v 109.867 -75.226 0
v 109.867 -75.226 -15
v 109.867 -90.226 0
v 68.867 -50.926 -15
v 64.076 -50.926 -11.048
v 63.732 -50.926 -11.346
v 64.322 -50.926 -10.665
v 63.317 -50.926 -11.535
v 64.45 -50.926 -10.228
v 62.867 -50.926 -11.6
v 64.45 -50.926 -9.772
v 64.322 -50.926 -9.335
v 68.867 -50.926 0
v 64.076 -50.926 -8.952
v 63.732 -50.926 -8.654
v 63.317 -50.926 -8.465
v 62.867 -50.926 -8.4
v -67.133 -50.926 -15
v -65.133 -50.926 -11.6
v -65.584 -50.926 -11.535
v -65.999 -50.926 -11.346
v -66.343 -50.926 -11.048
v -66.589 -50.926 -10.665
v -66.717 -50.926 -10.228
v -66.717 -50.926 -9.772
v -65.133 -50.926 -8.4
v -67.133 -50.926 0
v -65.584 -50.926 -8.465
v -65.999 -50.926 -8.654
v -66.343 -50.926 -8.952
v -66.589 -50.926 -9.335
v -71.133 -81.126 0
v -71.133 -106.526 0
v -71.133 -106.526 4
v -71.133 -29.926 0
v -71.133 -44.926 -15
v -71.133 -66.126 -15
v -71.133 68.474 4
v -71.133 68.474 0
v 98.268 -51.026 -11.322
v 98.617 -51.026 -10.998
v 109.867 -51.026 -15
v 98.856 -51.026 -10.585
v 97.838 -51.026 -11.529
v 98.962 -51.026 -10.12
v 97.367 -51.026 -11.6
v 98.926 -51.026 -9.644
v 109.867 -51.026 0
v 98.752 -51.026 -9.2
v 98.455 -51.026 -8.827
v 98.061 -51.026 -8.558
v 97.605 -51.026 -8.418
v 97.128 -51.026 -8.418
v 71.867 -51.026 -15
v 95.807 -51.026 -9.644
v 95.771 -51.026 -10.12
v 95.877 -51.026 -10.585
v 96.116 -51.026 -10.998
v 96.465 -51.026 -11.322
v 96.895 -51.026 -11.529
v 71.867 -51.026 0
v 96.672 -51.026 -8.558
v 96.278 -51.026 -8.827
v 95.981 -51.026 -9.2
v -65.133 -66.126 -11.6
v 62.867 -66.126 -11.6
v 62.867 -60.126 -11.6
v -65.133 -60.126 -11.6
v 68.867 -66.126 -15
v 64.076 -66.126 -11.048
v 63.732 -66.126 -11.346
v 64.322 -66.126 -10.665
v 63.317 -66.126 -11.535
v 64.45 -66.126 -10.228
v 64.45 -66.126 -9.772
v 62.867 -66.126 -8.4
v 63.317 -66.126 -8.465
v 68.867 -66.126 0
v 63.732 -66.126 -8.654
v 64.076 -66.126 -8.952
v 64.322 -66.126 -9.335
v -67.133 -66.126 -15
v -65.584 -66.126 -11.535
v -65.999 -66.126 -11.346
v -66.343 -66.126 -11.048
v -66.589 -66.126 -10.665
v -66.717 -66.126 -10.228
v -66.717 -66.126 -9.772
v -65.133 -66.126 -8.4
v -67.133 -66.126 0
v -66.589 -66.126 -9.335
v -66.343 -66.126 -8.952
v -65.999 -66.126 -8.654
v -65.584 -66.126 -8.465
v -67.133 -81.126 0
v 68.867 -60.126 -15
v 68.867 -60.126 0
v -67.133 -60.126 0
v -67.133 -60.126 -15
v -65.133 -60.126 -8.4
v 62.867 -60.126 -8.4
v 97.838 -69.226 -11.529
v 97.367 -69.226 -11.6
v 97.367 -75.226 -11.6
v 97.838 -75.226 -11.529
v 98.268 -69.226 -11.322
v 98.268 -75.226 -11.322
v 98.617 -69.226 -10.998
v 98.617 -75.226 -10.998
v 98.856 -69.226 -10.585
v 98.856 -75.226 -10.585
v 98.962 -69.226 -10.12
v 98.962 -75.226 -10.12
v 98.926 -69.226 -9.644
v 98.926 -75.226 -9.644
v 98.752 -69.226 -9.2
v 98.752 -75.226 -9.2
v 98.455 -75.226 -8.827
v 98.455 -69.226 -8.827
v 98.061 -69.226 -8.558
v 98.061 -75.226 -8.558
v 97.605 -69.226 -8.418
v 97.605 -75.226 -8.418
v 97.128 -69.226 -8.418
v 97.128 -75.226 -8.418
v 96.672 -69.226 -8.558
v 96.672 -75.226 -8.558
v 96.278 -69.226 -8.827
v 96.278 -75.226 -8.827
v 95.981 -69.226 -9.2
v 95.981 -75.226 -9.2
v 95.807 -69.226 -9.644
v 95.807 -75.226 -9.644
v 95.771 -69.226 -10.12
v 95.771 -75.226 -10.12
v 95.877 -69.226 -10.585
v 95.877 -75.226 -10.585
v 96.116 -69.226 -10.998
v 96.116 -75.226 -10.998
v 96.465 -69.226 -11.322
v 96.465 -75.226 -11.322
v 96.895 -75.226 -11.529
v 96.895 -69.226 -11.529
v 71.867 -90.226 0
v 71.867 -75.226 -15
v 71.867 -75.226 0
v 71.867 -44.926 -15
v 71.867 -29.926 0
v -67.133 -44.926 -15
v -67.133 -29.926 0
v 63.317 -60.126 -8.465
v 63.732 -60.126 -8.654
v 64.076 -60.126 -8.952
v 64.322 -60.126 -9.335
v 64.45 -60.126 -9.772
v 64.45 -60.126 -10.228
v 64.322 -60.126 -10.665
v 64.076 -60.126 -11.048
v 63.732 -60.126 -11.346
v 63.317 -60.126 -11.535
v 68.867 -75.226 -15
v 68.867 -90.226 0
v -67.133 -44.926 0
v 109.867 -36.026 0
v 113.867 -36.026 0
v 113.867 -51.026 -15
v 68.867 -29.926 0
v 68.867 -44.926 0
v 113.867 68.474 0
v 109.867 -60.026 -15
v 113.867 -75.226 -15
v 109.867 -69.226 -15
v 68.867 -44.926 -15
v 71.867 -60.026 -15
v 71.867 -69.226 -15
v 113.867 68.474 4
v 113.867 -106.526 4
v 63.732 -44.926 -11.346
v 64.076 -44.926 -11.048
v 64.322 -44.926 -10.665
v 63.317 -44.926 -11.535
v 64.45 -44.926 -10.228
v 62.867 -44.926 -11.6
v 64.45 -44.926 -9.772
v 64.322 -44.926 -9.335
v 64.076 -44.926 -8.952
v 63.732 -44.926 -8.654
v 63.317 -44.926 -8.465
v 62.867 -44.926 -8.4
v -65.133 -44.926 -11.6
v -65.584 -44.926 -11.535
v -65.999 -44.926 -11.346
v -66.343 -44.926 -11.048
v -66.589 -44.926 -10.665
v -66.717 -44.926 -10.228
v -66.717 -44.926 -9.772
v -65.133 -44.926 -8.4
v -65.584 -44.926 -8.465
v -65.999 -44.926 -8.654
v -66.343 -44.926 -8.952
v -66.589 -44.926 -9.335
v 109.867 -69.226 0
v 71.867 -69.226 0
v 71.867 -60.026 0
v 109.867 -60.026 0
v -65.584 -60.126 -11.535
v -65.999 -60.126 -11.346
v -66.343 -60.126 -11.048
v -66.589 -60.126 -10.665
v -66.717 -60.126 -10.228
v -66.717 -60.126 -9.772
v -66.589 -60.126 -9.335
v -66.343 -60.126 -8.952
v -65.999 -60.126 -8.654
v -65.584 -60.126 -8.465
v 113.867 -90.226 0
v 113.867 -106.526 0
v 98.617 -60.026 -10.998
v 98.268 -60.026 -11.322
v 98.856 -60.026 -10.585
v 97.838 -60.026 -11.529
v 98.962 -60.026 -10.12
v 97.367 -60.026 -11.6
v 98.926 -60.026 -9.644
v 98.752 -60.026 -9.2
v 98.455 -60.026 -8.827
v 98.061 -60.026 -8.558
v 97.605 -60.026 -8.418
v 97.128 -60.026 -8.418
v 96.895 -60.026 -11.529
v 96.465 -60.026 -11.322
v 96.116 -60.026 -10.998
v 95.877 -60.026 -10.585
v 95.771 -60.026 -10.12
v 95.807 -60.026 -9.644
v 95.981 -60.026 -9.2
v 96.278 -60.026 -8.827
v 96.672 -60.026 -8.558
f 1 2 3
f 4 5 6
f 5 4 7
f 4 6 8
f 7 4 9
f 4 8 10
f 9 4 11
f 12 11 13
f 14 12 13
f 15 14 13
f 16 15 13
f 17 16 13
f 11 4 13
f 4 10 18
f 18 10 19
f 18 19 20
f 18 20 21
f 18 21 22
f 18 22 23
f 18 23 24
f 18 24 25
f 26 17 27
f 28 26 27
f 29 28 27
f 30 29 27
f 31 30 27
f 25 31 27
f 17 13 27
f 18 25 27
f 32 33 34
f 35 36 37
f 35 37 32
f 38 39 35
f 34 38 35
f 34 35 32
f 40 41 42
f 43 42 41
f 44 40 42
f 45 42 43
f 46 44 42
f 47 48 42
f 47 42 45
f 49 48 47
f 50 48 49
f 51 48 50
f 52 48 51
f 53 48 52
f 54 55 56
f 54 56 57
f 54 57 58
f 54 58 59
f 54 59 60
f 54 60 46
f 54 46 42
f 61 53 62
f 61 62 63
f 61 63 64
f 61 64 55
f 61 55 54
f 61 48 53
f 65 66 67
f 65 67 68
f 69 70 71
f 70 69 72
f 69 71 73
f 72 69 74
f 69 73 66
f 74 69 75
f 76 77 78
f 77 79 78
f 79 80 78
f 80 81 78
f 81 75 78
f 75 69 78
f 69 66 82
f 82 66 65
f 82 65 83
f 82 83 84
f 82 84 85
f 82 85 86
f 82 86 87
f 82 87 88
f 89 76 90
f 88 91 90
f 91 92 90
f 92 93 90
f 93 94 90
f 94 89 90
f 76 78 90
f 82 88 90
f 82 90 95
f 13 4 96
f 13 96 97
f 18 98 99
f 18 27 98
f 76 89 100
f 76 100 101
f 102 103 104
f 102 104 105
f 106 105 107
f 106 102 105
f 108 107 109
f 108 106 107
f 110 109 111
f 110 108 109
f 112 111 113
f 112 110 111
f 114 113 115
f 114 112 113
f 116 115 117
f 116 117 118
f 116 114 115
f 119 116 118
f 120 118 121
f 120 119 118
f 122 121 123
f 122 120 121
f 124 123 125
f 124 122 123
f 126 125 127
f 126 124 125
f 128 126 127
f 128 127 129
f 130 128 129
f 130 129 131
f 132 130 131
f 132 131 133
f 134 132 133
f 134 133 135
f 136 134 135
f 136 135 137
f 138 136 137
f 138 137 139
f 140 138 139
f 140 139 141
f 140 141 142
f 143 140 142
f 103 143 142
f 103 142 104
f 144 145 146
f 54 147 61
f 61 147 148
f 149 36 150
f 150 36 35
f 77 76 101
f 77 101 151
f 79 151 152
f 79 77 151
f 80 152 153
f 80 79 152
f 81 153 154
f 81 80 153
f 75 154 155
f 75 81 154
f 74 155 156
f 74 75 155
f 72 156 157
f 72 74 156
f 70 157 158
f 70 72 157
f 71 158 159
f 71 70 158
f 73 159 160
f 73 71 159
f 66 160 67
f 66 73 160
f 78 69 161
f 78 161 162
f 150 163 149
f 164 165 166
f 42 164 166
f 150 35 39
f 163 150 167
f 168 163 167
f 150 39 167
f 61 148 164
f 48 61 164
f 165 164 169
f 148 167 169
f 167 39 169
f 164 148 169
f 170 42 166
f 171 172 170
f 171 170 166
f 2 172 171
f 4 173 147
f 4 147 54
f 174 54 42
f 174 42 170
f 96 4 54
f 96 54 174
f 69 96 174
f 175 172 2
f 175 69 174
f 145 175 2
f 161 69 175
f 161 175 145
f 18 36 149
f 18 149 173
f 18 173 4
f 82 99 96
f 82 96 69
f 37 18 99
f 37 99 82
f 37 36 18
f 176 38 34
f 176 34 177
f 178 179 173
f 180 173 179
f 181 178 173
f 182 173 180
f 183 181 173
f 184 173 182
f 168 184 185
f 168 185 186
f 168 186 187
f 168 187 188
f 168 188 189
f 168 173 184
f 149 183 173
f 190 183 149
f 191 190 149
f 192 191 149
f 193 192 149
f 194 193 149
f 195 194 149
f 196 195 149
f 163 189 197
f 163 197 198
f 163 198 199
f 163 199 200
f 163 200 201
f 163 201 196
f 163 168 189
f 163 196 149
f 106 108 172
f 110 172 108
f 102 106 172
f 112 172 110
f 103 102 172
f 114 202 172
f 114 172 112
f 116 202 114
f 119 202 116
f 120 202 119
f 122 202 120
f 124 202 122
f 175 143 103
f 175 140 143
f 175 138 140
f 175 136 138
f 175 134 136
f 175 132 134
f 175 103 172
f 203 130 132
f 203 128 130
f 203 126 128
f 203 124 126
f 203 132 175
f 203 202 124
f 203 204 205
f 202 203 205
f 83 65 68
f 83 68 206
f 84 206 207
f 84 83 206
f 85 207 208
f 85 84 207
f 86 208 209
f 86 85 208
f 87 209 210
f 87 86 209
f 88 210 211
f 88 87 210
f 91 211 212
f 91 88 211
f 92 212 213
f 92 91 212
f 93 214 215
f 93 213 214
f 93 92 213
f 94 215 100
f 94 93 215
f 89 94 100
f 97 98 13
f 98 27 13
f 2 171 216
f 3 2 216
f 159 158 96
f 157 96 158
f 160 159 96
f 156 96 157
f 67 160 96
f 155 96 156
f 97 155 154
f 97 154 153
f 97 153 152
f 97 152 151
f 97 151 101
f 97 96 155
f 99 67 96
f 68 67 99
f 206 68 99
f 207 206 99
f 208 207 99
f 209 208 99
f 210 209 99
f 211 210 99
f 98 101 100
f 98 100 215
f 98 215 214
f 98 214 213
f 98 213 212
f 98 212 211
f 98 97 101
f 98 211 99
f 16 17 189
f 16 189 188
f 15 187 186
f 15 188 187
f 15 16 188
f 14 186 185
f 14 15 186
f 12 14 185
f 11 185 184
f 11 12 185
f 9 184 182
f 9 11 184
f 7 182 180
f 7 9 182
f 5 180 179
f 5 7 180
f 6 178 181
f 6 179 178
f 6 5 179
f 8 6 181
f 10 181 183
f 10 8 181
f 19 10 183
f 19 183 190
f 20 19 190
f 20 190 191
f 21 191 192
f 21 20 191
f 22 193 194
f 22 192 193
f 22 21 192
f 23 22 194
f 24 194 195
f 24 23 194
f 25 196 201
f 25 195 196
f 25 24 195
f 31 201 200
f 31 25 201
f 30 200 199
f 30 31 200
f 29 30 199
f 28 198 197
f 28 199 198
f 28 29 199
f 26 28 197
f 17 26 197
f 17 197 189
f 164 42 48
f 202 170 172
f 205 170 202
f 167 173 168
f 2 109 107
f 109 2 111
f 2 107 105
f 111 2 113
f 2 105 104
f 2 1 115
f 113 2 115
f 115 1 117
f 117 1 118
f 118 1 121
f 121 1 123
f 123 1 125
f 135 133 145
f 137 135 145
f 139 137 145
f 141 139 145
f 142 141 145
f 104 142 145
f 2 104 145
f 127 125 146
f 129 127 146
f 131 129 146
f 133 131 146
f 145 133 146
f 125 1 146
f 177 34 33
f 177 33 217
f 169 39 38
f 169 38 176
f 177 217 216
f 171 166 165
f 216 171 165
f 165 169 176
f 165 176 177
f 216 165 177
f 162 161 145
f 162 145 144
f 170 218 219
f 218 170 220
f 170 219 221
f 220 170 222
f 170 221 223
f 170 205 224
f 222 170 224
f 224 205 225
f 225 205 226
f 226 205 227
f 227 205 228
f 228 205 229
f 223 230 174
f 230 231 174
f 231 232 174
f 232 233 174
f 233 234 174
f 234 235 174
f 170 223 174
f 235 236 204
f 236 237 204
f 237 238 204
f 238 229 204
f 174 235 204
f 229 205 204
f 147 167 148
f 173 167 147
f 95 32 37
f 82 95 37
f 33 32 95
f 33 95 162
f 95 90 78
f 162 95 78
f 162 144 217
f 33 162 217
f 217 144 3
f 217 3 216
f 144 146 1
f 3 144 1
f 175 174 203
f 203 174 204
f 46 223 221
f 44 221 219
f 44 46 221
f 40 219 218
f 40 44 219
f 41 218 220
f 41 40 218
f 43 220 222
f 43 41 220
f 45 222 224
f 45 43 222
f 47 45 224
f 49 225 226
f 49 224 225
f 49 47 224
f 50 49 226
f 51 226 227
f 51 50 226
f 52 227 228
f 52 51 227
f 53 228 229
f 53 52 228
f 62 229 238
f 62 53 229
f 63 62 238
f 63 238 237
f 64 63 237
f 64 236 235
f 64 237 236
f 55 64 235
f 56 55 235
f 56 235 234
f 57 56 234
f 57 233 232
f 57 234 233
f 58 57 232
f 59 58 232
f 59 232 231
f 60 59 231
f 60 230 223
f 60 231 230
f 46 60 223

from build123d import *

# Parameters (mm, degrees)
SKETCH_1_W          = 185
SKETCH_1_H          = 175
EXTRUDE_1_DEPTH     = 4
SKETCH_2_W          = 140
SKETCH_2_H          = 6
EXTRUDE_2_DEPTH     = 15
CUT_EXTRUDE_1_REACH = 210.987
SKETCH_4_W          = 45
SKETCH_4_H          = 9
SKETCH_4_H_2        = 6
EXTRUDE_5_DEPTH     = 15
SKETCH_7_W          = 185
SKETCH_7_H          = 4
EXTRUDE_6_DEPTH     = 40
SKETCH_6_W          = 185
SKETCH_6_H          = 4
CUT_EXTRUDE_3_DEPTH = 40
CUT_EXTRUDE_START   = -24.2
SKETCH_5_R          = 1.6
CUT_EXTRUDE_2_DEPTH = 24.2
EXTRUDE_7_DEPTH     = 3
EXTRUDE_8_DEPTH     = 4
EXTRUDE_9_DEPTH     = 4


with BuildPart() as part:
    # 草圖1 → 填料-伸長1 (new body)
    with BuildSketch(Plane.XY):
        with Locations((21.366509782, 20.973731884)):
            Rectangle(SKETCH_1_W, SKETCH_1_H)
    extrude(amount=EXTRUDE_1_DEPTH)

    # 草圖2 → 填料-伸長2 (add)
    with BuildSketch(Plane(origin=(0, 0, 0), x_dir=(-1, 0, 0), z_dir=(0, 0, -1))):
        with Locations((1.133490218, -63.126268116)):
            Rectangle(SKETCH_2_W, SKETCH_2_H)
        with Locations((1.133490218, -47.926268116)):
            Rectangle(SKETCH_2_W, SKETCH_2_H)
    extrude(amount=EXTRUDE_2_DEPTH)

    # 除料-伸長1: up to this face of the body (flat: up to its plane)
    cut_extrude_1_end = Plane(part.part.faces().sort_by_distance((-1.133490218, -44.926268116, -7.5))[0])
    # 草圖3 → 除料-伸長1 (cut, up to the picked face)
    with BuildSketch(Plane.XZ.offset(66.126268116), mode=Mode.PRIVATE) as cut_extrude_1_sk1:
        with BuildLine():
            Line((-65.133490218, -8.4), (62.866509782, -8.4))
            ThreePointArc((62.866509782, -8.4), (64.466509782, -10), (62.866509782, -11.6))
            Line((62.866509782, -11.6), (-65.133490218, -11.6))
            ThreePointArc((-65.133490218, -11.6), (-66.733490218, -10), (-65.133490218, -8.4))
        make_face()
    cut_extrude_1_tool1 = split(extrude(cut_extrude_1_sk1.sketch, amount=-CUT_EXTRUDE_1_REACH, mode=Mode.PRIVATE), bisect_by=cut_extrude_1_end, keep=Keep.BOTH, mode=Mode.PRIVATE)
    add(cut_extrude_1_tool1.solids().sort_by(Axis((-1.13349, -66.126268, -10), (0, 1, 0)))[0], mode=Mode.SUBTRACT)

    # 草圖4 → 填料-伸長5 (add)
    with BuildSketch(Plane(origin=(0, 0, 0), x_dir=(-1, 0, 0), z_dir=(0, 0, -1))):
        with Locations((-91.366509782, -55.526268116)):
            Rectangle(SKETCH_4_W, SKETCH_4_H)
        with Locations((-91.366509782, -72.226268116)):
            Rectangle(SKETCH_4_W, SKETCH_4_H_2)
    extrude(amount=EXTRUDE_5_DEPTH)


with BuildPart() as extrude_5_piece_1:
    # of the separate pieces the step leaves, piece 1, a body of its own (extrude_5_pieces)
    add(part.part.solids().sort_by_distance((-71.133490218, 108.473731884, 0))[0])

    # 草圖7 → 填料-伸長6 (add)
    with BuildSketch(Plane.XZ.offset(66.526268116)):
        with Locations((21.366509782, 2)):
            Rectangle(SKETCH_7_W, SKETCH_7_H)
    extrude(amount=EXTRUDE_6_DEPTH)

    # 草圖6 → 除料-伸長3 (cut)
    with BuildSketch(Plane(origin=(0, 108.473731884, 0), x_dir=(1, 0, 0), z_dir=(0, 1, 0))):
        with Locations((21.366509782, -2)):
            Rectangle(SKETCH_6_W, SKETCH_6_H)
    extrude(amount=-CUT_EXTRUDE_3_DEPTH, mode=Mode.SUBTRACT)


with BuildPart() as extrude_5_piece_2:
    # of the separate pieces the step leaves, piece 2, a body of its own (extrude_5_pieces)
    add(part.part.solids().sort_by_distance((68.866509782, -69.226268116, 0))[0])


with BuildPart() as cut_extrude_2_tool:
    # 草圖5 → 除料-伸長2 (new body)
    with BuildSketch(Plane.XZ.offset(75.226268116).offset(CUT_EXTRUDE_START)):
        with Locations(Location((97.366509782, -10, 0), (0, 0, 270))):
            Circle(SKETCH_5_R)
    extrude(amount=CUT_EXTRUDE_2_DEPTH)


with BuildPart() as extrude_5_piece_1_1:
    add(extrude_5_piece_1.part)

    # 除料-伸長2: cut by cut_extrude_2_tool
    add(cut_extrude_2_tool.part, mode=Mode.SUBTRACT)



with BuildPart() as extrude_5_piece_2_1:
    add(extrude_5_piece_2.part)

    # 除料-伸長2: cut by cut_extrude_2_tool
    add(cut_extrude_2_tool.part, mode=Mode.SUBTRACT)


with BuildPart() as extrude_5_piece_1_2:
    add(extrude_5_piece_1_1.part)

    add(extrude_5_piece_2_1.part)  # 填料-伸長7 merges 填料-伸長5 piece 2
    # 草圖8 → 填料-伸長7 (add)
    with BuildSketch(Plane(origin=(68.866509782, 0, 0), x_dir=(0, 0, -1), z_dir=(1, 0, 0))):
        Polygon((15, -44.926268116), (15, -75.226268116), (0, -90.226268116), (0, -29.926268116), align=None)
    extrude(amount=EXTRUDE_7_DEPTH)

    # 草圖9 → 填料-伸長8 (add)
    with BuildSketch(Plane(origin=(113.866509782, 0, 0), x_dir=(0, 0, -1), z_dir=(1, 0, 0))):
        Polygon((15, -51.026268116), (15, -75.226268116), (0, -90.226268116), (0, -36.026268116), align=None)
    extrude(amount=-EXTRUDE_8_DEPTH)

    # 草圖11 → 填料-伸長9 (add)
    with BuildSketch(Plane.ZY.offset(71.133490218)):
        Polygon((-15, -66.126268116), (-15, -44.926268116), (0, -29.926268116), (0, -81.126268116), align=None)
    extrude(amount=-EXTRUDE_9_DEPTH)


solid = extrude_5_piece_1_2.part
